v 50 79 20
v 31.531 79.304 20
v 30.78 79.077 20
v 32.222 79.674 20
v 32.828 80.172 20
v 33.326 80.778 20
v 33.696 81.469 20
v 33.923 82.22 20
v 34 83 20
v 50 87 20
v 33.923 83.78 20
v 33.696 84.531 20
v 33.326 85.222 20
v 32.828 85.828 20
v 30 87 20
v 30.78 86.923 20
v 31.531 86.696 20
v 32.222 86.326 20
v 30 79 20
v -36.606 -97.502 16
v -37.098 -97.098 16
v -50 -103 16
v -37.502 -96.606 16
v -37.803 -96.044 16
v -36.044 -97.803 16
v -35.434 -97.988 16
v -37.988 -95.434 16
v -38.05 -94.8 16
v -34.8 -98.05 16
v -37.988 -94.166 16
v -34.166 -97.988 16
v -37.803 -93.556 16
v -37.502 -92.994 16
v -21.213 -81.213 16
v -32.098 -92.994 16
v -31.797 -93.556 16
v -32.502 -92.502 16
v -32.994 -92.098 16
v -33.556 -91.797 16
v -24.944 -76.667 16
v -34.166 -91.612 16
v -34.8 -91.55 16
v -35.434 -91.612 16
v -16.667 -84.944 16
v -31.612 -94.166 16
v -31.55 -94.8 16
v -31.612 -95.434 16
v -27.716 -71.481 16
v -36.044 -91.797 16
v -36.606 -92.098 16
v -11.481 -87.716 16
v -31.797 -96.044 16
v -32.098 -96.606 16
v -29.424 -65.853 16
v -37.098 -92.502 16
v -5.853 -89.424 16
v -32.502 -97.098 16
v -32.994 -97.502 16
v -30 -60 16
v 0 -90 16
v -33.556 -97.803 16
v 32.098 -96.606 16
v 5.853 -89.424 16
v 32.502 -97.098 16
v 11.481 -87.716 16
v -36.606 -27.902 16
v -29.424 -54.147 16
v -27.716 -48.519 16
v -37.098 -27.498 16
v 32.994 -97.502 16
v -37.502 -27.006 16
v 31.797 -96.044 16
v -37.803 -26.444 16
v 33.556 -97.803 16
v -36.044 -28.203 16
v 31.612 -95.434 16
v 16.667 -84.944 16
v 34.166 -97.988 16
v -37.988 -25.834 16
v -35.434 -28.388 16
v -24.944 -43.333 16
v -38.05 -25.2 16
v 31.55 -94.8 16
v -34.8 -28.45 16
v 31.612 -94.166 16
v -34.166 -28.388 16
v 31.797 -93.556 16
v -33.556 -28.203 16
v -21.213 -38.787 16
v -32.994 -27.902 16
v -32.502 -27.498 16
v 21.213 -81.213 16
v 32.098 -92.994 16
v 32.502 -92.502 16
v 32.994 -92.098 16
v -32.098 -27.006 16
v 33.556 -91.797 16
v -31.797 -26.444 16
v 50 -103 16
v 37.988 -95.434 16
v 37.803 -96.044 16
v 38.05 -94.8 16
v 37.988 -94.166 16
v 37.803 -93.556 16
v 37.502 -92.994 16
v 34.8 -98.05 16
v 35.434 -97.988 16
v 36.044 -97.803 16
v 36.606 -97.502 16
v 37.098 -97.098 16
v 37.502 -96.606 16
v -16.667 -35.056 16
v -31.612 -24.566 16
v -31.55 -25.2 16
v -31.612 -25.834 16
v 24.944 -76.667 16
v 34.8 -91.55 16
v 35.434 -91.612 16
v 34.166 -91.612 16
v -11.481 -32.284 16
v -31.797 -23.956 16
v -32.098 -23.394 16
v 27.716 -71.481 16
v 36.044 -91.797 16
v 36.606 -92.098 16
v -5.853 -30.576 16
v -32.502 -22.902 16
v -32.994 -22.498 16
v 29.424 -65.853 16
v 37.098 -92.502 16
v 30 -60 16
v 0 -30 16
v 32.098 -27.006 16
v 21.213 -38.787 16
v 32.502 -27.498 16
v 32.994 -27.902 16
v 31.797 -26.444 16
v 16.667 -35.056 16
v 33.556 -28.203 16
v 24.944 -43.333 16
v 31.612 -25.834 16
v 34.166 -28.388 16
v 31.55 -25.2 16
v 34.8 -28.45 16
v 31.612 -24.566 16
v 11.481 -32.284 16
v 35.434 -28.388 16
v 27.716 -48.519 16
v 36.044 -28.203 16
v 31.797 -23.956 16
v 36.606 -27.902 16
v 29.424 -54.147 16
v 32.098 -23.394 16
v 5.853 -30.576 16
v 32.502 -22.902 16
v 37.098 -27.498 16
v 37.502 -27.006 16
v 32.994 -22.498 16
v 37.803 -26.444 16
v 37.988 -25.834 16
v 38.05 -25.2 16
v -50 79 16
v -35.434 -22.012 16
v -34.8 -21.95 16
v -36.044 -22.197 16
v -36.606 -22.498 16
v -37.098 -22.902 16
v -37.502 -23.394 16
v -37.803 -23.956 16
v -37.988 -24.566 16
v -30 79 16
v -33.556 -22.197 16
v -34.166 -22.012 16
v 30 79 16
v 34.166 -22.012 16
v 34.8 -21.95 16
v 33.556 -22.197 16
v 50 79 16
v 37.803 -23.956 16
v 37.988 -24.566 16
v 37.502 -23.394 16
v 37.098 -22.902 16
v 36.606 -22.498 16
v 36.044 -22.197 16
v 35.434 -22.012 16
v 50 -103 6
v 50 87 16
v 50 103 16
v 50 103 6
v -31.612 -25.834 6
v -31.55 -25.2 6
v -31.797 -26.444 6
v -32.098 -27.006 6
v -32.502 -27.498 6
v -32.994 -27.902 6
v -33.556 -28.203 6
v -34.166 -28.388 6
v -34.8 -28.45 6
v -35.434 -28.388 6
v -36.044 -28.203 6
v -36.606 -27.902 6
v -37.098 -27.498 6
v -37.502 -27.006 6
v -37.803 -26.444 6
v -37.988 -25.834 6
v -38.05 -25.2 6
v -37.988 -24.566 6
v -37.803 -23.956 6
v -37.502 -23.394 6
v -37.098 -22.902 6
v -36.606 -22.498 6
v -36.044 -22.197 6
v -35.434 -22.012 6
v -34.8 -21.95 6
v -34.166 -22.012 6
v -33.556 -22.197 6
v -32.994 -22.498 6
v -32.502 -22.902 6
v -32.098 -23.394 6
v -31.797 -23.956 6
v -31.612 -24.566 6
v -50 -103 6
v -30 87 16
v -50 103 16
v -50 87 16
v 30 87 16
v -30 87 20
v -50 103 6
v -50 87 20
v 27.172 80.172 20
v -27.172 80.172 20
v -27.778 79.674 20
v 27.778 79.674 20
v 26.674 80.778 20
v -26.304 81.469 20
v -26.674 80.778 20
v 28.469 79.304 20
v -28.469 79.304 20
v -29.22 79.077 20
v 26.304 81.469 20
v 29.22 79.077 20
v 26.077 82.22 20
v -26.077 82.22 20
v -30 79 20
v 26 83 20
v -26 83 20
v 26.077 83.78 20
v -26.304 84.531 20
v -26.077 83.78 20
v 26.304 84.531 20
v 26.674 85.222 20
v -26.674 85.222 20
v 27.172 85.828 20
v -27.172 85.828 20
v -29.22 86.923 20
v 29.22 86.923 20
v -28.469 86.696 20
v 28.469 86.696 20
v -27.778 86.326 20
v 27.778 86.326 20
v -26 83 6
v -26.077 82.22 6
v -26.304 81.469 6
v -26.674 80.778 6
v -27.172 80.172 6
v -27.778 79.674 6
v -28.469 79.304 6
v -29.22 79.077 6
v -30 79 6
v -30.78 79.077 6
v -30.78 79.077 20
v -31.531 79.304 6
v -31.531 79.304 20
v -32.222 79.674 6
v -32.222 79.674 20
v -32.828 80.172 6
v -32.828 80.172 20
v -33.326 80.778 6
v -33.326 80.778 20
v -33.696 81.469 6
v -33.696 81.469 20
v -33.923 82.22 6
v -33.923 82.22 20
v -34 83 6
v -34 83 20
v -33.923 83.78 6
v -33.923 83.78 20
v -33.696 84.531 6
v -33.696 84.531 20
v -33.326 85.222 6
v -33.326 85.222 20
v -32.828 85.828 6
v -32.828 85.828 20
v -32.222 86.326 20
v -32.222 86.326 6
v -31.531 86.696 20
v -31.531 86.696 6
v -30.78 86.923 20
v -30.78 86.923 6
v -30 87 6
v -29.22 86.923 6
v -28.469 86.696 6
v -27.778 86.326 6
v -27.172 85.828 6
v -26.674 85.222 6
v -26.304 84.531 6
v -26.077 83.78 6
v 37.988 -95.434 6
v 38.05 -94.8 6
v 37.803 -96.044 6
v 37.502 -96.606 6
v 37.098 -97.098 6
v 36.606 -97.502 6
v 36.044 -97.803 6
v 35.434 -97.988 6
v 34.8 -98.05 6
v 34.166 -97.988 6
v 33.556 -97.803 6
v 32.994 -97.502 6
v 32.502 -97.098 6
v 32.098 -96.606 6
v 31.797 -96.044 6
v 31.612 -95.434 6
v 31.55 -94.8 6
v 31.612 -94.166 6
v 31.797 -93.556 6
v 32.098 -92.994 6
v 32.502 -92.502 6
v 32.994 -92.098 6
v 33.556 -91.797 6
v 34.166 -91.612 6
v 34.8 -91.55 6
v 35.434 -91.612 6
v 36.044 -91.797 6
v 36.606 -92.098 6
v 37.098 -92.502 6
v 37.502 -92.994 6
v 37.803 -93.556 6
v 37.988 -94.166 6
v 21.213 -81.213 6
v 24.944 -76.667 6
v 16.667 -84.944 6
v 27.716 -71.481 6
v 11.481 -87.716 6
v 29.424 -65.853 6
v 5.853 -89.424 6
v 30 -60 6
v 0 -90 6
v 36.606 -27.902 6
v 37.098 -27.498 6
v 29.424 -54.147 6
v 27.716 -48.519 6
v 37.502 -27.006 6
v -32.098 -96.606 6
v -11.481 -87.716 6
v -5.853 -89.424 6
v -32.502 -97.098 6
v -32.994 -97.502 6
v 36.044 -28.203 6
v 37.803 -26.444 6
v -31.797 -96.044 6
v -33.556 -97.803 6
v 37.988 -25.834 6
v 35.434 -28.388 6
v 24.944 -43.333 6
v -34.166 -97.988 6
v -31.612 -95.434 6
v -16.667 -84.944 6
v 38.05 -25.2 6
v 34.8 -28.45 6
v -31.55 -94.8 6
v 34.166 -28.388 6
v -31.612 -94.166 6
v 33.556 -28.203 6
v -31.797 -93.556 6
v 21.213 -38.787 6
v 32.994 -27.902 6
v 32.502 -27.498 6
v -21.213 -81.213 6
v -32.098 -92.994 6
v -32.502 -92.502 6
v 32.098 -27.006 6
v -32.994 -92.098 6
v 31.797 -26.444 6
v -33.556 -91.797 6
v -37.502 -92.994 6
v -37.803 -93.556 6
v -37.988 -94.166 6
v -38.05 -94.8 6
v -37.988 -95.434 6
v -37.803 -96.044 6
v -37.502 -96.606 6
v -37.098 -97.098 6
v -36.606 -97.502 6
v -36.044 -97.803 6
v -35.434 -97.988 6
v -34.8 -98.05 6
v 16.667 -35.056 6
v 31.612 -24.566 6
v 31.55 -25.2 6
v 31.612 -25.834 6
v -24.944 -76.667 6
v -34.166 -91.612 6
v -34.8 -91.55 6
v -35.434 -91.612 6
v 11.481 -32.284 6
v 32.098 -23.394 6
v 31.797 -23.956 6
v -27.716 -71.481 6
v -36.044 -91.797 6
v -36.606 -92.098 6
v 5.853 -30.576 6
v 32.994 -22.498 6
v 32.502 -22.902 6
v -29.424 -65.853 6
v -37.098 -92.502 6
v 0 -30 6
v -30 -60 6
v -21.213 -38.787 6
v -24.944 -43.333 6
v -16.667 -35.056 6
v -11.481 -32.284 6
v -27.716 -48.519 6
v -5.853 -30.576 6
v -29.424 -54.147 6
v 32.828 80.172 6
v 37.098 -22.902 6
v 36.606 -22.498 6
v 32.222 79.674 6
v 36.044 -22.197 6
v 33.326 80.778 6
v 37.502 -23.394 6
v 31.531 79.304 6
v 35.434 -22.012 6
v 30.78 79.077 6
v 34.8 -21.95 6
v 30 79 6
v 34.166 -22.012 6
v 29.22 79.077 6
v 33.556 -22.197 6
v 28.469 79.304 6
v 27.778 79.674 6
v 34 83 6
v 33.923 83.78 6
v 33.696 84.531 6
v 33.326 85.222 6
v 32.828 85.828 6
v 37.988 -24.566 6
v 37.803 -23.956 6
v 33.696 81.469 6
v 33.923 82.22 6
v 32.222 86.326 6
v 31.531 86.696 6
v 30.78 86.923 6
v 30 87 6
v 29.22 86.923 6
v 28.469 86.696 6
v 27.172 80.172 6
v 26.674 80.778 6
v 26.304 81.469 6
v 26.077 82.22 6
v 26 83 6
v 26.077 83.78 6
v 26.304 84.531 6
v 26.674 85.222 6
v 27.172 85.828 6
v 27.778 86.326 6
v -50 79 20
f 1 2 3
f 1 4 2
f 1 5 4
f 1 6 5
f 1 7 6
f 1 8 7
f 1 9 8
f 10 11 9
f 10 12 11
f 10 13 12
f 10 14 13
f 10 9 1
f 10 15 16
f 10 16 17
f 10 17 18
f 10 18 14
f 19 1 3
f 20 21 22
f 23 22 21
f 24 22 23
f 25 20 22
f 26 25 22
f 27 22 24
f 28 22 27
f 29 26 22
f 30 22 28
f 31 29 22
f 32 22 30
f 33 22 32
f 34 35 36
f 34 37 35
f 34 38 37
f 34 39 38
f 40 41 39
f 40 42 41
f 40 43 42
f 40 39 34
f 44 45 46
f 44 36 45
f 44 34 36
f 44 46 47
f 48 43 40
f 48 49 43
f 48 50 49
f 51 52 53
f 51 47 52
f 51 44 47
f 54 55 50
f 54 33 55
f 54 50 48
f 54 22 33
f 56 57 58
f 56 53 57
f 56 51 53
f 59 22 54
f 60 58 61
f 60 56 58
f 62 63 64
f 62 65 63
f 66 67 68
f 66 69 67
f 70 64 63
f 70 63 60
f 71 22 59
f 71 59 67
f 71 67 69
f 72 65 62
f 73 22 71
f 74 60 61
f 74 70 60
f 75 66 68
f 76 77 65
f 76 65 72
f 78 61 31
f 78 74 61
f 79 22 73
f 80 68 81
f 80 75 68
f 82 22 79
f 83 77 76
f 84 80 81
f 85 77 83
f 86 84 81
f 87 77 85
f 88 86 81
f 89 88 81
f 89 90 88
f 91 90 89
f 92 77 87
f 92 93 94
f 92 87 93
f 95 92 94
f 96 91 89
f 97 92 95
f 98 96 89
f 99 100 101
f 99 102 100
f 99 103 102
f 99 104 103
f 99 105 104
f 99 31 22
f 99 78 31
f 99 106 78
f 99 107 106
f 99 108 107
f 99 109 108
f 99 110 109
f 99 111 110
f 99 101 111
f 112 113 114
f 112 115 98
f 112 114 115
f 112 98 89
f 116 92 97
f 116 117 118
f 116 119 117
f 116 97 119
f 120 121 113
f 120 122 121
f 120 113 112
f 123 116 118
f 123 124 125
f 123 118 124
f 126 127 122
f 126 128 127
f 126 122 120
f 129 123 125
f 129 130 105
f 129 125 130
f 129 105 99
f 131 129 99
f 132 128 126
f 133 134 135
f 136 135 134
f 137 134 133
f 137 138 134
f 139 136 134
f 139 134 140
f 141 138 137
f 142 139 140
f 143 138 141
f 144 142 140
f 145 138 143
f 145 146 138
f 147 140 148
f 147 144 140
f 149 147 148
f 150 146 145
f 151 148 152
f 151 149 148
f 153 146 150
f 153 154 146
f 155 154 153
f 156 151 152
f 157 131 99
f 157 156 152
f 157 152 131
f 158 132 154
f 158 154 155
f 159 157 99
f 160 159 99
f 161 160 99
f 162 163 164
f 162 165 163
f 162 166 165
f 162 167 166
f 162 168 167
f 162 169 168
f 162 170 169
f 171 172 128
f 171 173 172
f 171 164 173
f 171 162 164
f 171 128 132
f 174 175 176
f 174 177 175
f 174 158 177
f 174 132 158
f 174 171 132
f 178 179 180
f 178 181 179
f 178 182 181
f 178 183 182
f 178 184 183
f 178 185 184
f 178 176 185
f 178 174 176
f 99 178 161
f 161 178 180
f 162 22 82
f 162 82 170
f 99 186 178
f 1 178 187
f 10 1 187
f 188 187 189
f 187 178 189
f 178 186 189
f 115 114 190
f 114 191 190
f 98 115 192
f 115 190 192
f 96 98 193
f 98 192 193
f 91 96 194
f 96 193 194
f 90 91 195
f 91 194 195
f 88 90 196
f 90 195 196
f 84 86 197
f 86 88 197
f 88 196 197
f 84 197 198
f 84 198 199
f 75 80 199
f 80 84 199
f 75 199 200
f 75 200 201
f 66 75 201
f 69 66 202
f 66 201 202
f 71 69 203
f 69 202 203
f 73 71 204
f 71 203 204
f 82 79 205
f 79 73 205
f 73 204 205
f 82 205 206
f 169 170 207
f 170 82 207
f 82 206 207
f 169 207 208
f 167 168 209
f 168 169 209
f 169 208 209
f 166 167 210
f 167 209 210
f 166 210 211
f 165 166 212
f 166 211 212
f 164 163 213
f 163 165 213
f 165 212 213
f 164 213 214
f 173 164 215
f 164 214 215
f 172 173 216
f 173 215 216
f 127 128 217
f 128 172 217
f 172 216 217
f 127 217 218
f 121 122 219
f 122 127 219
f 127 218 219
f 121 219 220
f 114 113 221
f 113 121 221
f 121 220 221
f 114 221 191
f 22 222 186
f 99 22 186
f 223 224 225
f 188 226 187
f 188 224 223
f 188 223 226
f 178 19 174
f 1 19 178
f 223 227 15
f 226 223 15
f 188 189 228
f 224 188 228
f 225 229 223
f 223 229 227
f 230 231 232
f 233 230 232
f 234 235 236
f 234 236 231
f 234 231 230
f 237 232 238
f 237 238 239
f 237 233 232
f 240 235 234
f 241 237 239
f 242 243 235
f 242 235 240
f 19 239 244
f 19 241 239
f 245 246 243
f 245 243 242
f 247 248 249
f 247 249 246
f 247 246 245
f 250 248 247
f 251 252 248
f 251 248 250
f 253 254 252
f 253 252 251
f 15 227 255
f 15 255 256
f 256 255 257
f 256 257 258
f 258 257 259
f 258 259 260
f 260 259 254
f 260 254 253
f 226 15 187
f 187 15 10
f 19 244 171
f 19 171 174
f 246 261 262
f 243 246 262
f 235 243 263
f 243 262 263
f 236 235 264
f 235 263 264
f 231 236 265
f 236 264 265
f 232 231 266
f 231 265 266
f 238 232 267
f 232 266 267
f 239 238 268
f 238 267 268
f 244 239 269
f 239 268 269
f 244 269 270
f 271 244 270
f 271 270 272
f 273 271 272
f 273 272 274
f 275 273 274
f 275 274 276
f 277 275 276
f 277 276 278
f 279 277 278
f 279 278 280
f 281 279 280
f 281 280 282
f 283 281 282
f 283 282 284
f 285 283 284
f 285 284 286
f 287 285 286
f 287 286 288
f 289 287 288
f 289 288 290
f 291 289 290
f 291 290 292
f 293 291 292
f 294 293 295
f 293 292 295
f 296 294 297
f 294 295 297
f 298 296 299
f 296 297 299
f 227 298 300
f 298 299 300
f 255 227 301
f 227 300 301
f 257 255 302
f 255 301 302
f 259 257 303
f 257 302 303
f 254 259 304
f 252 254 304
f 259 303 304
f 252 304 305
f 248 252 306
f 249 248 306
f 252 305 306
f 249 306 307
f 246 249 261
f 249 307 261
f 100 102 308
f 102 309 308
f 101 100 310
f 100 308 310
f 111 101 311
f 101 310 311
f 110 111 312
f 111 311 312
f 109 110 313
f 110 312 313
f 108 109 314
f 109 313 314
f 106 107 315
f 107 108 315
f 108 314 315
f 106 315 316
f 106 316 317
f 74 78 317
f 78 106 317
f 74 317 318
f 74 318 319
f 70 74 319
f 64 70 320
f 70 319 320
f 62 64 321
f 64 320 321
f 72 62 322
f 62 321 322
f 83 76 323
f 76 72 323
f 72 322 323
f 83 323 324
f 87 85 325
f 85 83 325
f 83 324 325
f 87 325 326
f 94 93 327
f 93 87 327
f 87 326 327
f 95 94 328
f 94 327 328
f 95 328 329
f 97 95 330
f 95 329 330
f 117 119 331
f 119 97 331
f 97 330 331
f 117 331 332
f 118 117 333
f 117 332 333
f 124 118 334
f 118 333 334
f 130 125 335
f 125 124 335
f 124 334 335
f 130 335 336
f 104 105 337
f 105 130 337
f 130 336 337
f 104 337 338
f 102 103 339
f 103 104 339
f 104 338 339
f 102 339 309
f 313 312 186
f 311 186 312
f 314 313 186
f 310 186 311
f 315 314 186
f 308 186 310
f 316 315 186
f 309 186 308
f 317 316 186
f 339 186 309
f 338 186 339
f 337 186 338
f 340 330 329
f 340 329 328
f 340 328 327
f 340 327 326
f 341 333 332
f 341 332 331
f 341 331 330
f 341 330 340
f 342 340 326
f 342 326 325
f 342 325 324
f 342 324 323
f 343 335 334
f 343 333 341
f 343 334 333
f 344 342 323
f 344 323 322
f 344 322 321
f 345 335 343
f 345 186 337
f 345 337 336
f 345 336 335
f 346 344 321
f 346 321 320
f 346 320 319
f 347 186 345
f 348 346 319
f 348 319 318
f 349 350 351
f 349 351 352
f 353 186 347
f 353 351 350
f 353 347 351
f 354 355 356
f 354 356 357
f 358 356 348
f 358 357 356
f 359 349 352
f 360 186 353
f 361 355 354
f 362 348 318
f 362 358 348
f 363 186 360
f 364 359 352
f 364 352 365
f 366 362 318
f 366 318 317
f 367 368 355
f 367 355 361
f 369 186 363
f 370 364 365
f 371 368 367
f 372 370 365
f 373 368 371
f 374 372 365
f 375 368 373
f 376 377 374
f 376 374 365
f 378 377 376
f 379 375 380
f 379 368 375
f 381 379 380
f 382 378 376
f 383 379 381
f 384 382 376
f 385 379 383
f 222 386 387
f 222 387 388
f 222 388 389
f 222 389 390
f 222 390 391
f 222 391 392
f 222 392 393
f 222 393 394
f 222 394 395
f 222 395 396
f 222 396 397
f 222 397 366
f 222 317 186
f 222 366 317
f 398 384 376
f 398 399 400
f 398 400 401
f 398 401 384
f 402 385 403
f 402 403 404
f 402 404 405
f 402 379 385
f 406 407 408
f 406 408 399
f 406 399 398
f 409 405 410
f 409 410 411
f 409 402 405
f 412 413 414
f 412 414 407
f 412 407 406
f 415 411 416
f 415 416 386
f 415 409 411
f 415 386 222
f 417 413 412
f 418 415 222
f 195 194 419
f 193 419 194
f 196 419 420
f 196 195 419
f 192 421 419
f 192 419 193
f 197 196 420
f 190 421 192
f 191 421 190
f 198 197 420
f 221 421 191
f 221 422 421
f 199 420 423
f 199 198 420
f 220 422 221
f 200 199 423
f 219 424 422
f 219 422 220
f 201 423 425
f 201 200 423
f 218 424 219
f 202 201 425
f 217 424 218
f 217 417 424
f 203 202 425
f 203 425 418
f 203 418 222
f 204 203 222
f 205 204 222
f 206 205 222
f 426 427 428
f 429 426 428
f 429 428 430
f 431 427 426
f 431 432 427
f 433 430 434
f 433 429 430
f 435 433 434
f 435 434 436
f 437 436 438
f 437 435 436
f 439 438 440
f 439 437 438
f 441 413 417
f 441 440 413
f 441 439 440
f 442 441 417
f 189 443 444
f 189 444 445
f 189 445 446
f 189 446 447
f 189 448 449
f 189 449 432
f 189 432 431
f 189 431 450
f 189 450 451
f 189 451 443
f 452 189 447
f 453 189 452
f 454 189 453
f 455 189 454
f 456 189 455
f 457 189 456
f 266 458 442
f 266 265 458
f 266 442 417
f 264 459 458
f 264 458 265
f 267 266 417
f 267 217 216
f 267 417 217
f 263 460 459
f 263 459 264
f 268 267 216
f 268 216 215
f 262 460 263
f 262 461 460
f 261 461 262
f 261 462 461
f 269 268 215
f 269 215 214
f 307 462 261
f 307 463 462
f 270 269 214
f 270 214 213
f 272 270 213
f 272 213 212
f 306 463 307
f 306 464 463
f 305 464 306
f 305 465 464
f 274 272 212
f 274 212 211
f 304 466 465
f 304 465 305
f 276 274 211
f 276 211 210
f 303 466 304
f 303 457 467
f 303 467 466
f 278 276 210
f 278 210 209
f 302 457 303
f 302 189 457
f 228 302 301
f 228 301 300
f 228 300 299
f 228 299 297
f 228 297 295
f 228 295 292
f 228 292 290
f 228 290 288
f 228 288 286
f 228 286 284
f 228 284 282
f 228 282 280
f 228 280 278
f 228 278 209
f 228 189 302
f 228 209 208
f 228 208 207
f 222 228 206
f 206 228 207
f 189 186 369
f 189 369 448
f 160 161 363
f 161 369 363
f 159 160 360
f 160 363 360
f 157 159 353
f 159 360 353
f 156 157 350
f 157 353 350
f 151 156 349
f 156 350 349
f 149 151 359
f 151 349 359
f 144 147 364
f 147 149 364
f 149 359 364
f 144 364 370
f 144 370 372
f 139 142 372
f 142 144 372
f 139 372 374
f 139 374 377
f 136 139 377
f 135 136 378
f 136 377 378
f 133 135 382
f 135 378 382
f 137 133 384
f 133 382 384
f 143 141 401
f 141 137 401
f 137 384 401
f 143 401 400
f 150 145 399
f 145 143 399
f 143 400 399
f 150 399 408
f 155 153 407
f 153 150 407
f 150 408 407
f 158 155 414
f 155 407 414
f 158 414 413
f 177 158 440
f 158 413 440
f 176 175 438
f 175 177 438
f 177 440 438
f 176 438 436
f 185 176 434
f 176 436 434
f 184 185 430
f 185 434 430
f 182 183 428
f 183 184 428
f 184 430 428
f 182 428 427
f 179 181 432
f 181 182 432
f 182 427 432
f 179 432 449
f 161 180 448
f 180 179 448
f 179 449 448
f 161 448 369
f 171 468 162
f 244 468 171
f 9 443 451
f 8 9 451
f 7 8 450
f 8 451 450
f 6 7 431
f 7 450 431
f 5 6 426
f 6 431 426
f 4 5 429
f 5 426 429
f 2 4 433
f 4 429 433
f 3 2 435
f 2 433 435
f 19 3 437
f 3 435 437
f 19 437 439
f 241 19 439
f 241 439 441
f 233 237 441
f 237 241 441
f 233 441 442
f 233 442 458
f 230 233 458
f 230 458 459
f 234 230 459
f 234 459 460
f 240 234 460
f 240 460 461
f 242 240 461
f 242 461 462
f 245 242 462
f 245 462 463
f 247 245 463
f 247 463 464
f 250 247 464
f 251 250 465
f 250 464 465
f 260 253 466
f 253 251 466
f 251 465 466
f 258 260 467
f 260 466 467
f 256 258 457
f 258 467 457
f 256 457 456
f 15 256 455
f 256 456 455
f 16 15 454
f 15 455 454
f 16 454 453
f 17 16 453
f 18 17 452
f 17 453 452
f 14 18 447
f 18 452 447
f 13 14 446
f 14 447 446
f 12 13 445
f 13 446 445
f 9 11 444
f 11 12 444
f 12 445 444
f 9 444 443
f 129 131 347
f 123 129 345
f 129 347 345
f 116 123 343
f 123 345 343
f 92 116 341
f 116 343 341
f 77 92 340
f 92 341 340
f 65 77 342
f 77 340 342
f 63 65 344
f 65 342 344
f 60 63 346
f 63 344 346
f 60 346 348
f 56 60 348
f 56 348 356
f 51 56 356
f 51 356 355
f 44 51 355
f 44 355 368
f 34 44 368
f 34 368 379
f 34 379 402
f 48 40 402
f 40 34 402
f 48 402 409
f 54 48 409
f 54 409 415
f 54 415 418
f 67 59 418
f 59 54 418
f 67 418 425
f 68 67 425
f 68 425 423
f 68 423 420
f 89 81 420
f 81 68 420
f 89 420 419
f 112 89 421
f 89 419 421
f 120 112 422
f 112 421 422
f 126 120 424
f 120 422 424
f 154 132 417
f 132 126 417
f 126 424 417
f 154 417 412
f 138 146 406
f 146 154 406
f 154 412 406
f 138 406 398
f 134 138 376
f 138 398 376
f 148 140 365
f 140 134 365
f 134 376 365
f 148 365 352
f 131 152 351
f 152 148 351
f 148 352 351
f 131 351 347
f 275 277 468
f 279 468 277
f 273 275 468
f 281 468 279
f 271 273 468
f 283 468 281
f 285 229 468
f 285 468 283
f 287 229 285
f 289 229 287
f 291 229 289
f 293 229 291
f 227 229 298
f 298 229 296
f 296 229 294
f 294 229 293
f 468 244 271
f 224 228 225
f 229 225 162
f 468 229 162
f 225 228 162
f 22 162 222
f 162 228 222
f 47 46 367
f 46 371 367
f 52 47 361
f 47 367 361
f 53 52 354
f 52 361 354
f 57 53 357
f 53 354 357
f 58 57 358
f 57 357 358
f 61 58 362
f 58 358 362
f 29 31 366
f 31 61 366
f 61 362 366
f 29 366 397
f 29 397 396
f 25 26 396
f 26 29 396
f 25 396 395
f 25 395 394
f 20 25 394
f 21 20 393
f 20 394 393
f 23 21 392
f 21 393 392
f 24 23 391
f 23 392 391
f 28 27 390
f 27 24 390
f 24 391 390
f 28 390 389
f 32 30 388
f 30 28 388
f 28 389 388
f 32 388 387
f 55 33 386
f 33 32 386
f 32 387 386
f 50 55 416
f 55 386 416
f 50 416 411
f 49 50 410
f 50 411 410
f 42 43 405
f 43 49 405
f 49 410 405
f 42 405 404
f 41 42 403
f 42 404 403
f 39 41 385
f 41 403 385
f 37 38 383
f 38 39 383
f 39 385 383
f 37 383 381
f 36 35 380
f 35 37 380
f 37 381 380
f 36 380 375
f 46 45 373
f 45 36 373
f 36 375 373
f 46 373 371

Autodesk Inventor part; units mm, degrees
ref_plane "YZ Plane" through (0, 0, 0) normal (1, 0, 0) x (0, 1, 0)
ref_plane "XZ Plane" through (0, 0, 0) normal (0, 1, 0) x (-1, 0, 0)
ref_plane "XY Plane" through (0, 0, 0) normal (0, 0, 1) x (1, 0, 0)
sketch "Sketch1" plane through (0, 0, 0) normal (0, 0, 1) x (1, 0, 0)
  line L0 (0, 144.2) -> (0, -144.2) projected
  line L1 (-70, 0) -> (70, 0) projected
  line L2 (-50, -103) -> (50, -103)
  line L3 (50, -103) -> (50, 103)
  line L4 (50, 103) -> (-50, 103)
  line L5 (-50, 103) -> (-50, -103)
  circle A0 centre (0, -60) radius 30
  circle A1 centre (-30, 83) radius 4
  circle A2 centre (30, 83) radius 4
  circle A3 centre (34.8, -94.8) radius 3.25
  circle A4 centre (34.8, -25.2) radius 3.25
  circle A5 centre (-34.8, -25.2) radius 3.25
  circle A6 centre (-34.8, -94.8) radius 3.25
  line L6 (-30, 83) -> (-30, 79)
  line L7 (0, -60) -> (0, -30)
  point P0 (0, 0)
  dimension "d2" = 60
  dimension "d4" = 8
  dimension "d0" = 100
  dimension "d1" = 206
  dimension "d3" = 43
  dimension "d5" = 8
  dimension "d6" = 20
  dimension "d7" = 20
  dimension "d8" = 20
  dimension "d9" = 20
  dimension "d10" = 6.5
  dimension "d11" = 6.5
  dimension "d12" = 6.5
  dimension "d13" = 6.5
  dimension "d14" = 69.6
  dimension "d15" = 69.6
  dimension "d16" = 69.6
  dimension "d17" = 69.6
  dimension "d18" = 0
  dimension "d19" = 0
  dimension "d20" = 34.8
  dimension "d21" = 34.8
  dimension "d22" = 109
extrude "Extrusion1" add sketch "Sketch1" along normal blind 20 contours A0 L0 L2 L5 L1 | L0 L1 L3 L2 A0 | L1 L5 L4 L0 | L0 L4 L3 L1
sketch "Sketch2" plane through (0, 0, 20) normal (0, 0, 1) x (1, 0, 0)
  line L0 (50, 103) -> (-50, 103) projected
  line L1 (-50, 103) -> (-50, -103) projected
  line L2 (-50, -103) -> (50, -103) projected
  line L3 (50, -103) -> (50, 103) projected
  circle A0 centre (30, 83) radius 4 projected
  circle A1 centre (34.8, -25.2) radius 3.25 projected
  circle A2 centre (34.8, -94.8) radius 3.25 projected
  circle A3 centre (-34.8, -94.8) radius 3.25 projected
  circle A4 centre (-34.8, -25.2) radius 3.25 projected
  circle A5 centre (-30, 83) radius 4 projected
  circle A6 centre (0, -60) radius 30 projected
  line L4 (-50, 103) -> (-50, -103) projected
  line L5 (-50, 83) -> (50, 83)
  line L6 (-50, 87) -> (50, 87)
  line L7 (-50, 79) -> (50, 79)
  point P0 (0, 0)
  point P1 (50, 79)
  point P2 (-50, 79)
  point P3 (-50, 87)
  point P4 (50, 87)
  dimension "d25" = 4
  dimension "d26" = 4
extrude "Extrusion2" cut sketch "Sketch2" against normal blind 4 contours L3 L6 L1 L0 | L3 L2 L1 L7
sketch "Sketch3" plane through (0, 0, 0) normal (0, 0, -1) x (-1, 0, 0)
  line L0 (-50, 103) -> (50, 103) projected
  line L1 (-50, -103) -> (-50, 103) projected
  line L2 (50, -103) -> (-50, -103) projected
  line L3 (50, 103) -> (50, -103) projected
  circle A0 centre (-30, 83) radius 4 projected
  circle A1 centre (-34.8, -25.2) radius 3.25 projected
  circle A2 centre (-34.8, -94.8) radius 3.25 projected
  circle A3 centre (34.8, -94.8) radius 3.25 projected
  circle A4 centre (34.8, -25.2) radius 3.25 projected
  circle A5 centre (30, 83) radius 4 projected
  circle A6 centre (0, -60) radius 30 projected
  point P0 (0, 0)
extrude "Extrusion3" cut sketch "Sketch3" against normal blind 6
properties part number "motor mount upper"
